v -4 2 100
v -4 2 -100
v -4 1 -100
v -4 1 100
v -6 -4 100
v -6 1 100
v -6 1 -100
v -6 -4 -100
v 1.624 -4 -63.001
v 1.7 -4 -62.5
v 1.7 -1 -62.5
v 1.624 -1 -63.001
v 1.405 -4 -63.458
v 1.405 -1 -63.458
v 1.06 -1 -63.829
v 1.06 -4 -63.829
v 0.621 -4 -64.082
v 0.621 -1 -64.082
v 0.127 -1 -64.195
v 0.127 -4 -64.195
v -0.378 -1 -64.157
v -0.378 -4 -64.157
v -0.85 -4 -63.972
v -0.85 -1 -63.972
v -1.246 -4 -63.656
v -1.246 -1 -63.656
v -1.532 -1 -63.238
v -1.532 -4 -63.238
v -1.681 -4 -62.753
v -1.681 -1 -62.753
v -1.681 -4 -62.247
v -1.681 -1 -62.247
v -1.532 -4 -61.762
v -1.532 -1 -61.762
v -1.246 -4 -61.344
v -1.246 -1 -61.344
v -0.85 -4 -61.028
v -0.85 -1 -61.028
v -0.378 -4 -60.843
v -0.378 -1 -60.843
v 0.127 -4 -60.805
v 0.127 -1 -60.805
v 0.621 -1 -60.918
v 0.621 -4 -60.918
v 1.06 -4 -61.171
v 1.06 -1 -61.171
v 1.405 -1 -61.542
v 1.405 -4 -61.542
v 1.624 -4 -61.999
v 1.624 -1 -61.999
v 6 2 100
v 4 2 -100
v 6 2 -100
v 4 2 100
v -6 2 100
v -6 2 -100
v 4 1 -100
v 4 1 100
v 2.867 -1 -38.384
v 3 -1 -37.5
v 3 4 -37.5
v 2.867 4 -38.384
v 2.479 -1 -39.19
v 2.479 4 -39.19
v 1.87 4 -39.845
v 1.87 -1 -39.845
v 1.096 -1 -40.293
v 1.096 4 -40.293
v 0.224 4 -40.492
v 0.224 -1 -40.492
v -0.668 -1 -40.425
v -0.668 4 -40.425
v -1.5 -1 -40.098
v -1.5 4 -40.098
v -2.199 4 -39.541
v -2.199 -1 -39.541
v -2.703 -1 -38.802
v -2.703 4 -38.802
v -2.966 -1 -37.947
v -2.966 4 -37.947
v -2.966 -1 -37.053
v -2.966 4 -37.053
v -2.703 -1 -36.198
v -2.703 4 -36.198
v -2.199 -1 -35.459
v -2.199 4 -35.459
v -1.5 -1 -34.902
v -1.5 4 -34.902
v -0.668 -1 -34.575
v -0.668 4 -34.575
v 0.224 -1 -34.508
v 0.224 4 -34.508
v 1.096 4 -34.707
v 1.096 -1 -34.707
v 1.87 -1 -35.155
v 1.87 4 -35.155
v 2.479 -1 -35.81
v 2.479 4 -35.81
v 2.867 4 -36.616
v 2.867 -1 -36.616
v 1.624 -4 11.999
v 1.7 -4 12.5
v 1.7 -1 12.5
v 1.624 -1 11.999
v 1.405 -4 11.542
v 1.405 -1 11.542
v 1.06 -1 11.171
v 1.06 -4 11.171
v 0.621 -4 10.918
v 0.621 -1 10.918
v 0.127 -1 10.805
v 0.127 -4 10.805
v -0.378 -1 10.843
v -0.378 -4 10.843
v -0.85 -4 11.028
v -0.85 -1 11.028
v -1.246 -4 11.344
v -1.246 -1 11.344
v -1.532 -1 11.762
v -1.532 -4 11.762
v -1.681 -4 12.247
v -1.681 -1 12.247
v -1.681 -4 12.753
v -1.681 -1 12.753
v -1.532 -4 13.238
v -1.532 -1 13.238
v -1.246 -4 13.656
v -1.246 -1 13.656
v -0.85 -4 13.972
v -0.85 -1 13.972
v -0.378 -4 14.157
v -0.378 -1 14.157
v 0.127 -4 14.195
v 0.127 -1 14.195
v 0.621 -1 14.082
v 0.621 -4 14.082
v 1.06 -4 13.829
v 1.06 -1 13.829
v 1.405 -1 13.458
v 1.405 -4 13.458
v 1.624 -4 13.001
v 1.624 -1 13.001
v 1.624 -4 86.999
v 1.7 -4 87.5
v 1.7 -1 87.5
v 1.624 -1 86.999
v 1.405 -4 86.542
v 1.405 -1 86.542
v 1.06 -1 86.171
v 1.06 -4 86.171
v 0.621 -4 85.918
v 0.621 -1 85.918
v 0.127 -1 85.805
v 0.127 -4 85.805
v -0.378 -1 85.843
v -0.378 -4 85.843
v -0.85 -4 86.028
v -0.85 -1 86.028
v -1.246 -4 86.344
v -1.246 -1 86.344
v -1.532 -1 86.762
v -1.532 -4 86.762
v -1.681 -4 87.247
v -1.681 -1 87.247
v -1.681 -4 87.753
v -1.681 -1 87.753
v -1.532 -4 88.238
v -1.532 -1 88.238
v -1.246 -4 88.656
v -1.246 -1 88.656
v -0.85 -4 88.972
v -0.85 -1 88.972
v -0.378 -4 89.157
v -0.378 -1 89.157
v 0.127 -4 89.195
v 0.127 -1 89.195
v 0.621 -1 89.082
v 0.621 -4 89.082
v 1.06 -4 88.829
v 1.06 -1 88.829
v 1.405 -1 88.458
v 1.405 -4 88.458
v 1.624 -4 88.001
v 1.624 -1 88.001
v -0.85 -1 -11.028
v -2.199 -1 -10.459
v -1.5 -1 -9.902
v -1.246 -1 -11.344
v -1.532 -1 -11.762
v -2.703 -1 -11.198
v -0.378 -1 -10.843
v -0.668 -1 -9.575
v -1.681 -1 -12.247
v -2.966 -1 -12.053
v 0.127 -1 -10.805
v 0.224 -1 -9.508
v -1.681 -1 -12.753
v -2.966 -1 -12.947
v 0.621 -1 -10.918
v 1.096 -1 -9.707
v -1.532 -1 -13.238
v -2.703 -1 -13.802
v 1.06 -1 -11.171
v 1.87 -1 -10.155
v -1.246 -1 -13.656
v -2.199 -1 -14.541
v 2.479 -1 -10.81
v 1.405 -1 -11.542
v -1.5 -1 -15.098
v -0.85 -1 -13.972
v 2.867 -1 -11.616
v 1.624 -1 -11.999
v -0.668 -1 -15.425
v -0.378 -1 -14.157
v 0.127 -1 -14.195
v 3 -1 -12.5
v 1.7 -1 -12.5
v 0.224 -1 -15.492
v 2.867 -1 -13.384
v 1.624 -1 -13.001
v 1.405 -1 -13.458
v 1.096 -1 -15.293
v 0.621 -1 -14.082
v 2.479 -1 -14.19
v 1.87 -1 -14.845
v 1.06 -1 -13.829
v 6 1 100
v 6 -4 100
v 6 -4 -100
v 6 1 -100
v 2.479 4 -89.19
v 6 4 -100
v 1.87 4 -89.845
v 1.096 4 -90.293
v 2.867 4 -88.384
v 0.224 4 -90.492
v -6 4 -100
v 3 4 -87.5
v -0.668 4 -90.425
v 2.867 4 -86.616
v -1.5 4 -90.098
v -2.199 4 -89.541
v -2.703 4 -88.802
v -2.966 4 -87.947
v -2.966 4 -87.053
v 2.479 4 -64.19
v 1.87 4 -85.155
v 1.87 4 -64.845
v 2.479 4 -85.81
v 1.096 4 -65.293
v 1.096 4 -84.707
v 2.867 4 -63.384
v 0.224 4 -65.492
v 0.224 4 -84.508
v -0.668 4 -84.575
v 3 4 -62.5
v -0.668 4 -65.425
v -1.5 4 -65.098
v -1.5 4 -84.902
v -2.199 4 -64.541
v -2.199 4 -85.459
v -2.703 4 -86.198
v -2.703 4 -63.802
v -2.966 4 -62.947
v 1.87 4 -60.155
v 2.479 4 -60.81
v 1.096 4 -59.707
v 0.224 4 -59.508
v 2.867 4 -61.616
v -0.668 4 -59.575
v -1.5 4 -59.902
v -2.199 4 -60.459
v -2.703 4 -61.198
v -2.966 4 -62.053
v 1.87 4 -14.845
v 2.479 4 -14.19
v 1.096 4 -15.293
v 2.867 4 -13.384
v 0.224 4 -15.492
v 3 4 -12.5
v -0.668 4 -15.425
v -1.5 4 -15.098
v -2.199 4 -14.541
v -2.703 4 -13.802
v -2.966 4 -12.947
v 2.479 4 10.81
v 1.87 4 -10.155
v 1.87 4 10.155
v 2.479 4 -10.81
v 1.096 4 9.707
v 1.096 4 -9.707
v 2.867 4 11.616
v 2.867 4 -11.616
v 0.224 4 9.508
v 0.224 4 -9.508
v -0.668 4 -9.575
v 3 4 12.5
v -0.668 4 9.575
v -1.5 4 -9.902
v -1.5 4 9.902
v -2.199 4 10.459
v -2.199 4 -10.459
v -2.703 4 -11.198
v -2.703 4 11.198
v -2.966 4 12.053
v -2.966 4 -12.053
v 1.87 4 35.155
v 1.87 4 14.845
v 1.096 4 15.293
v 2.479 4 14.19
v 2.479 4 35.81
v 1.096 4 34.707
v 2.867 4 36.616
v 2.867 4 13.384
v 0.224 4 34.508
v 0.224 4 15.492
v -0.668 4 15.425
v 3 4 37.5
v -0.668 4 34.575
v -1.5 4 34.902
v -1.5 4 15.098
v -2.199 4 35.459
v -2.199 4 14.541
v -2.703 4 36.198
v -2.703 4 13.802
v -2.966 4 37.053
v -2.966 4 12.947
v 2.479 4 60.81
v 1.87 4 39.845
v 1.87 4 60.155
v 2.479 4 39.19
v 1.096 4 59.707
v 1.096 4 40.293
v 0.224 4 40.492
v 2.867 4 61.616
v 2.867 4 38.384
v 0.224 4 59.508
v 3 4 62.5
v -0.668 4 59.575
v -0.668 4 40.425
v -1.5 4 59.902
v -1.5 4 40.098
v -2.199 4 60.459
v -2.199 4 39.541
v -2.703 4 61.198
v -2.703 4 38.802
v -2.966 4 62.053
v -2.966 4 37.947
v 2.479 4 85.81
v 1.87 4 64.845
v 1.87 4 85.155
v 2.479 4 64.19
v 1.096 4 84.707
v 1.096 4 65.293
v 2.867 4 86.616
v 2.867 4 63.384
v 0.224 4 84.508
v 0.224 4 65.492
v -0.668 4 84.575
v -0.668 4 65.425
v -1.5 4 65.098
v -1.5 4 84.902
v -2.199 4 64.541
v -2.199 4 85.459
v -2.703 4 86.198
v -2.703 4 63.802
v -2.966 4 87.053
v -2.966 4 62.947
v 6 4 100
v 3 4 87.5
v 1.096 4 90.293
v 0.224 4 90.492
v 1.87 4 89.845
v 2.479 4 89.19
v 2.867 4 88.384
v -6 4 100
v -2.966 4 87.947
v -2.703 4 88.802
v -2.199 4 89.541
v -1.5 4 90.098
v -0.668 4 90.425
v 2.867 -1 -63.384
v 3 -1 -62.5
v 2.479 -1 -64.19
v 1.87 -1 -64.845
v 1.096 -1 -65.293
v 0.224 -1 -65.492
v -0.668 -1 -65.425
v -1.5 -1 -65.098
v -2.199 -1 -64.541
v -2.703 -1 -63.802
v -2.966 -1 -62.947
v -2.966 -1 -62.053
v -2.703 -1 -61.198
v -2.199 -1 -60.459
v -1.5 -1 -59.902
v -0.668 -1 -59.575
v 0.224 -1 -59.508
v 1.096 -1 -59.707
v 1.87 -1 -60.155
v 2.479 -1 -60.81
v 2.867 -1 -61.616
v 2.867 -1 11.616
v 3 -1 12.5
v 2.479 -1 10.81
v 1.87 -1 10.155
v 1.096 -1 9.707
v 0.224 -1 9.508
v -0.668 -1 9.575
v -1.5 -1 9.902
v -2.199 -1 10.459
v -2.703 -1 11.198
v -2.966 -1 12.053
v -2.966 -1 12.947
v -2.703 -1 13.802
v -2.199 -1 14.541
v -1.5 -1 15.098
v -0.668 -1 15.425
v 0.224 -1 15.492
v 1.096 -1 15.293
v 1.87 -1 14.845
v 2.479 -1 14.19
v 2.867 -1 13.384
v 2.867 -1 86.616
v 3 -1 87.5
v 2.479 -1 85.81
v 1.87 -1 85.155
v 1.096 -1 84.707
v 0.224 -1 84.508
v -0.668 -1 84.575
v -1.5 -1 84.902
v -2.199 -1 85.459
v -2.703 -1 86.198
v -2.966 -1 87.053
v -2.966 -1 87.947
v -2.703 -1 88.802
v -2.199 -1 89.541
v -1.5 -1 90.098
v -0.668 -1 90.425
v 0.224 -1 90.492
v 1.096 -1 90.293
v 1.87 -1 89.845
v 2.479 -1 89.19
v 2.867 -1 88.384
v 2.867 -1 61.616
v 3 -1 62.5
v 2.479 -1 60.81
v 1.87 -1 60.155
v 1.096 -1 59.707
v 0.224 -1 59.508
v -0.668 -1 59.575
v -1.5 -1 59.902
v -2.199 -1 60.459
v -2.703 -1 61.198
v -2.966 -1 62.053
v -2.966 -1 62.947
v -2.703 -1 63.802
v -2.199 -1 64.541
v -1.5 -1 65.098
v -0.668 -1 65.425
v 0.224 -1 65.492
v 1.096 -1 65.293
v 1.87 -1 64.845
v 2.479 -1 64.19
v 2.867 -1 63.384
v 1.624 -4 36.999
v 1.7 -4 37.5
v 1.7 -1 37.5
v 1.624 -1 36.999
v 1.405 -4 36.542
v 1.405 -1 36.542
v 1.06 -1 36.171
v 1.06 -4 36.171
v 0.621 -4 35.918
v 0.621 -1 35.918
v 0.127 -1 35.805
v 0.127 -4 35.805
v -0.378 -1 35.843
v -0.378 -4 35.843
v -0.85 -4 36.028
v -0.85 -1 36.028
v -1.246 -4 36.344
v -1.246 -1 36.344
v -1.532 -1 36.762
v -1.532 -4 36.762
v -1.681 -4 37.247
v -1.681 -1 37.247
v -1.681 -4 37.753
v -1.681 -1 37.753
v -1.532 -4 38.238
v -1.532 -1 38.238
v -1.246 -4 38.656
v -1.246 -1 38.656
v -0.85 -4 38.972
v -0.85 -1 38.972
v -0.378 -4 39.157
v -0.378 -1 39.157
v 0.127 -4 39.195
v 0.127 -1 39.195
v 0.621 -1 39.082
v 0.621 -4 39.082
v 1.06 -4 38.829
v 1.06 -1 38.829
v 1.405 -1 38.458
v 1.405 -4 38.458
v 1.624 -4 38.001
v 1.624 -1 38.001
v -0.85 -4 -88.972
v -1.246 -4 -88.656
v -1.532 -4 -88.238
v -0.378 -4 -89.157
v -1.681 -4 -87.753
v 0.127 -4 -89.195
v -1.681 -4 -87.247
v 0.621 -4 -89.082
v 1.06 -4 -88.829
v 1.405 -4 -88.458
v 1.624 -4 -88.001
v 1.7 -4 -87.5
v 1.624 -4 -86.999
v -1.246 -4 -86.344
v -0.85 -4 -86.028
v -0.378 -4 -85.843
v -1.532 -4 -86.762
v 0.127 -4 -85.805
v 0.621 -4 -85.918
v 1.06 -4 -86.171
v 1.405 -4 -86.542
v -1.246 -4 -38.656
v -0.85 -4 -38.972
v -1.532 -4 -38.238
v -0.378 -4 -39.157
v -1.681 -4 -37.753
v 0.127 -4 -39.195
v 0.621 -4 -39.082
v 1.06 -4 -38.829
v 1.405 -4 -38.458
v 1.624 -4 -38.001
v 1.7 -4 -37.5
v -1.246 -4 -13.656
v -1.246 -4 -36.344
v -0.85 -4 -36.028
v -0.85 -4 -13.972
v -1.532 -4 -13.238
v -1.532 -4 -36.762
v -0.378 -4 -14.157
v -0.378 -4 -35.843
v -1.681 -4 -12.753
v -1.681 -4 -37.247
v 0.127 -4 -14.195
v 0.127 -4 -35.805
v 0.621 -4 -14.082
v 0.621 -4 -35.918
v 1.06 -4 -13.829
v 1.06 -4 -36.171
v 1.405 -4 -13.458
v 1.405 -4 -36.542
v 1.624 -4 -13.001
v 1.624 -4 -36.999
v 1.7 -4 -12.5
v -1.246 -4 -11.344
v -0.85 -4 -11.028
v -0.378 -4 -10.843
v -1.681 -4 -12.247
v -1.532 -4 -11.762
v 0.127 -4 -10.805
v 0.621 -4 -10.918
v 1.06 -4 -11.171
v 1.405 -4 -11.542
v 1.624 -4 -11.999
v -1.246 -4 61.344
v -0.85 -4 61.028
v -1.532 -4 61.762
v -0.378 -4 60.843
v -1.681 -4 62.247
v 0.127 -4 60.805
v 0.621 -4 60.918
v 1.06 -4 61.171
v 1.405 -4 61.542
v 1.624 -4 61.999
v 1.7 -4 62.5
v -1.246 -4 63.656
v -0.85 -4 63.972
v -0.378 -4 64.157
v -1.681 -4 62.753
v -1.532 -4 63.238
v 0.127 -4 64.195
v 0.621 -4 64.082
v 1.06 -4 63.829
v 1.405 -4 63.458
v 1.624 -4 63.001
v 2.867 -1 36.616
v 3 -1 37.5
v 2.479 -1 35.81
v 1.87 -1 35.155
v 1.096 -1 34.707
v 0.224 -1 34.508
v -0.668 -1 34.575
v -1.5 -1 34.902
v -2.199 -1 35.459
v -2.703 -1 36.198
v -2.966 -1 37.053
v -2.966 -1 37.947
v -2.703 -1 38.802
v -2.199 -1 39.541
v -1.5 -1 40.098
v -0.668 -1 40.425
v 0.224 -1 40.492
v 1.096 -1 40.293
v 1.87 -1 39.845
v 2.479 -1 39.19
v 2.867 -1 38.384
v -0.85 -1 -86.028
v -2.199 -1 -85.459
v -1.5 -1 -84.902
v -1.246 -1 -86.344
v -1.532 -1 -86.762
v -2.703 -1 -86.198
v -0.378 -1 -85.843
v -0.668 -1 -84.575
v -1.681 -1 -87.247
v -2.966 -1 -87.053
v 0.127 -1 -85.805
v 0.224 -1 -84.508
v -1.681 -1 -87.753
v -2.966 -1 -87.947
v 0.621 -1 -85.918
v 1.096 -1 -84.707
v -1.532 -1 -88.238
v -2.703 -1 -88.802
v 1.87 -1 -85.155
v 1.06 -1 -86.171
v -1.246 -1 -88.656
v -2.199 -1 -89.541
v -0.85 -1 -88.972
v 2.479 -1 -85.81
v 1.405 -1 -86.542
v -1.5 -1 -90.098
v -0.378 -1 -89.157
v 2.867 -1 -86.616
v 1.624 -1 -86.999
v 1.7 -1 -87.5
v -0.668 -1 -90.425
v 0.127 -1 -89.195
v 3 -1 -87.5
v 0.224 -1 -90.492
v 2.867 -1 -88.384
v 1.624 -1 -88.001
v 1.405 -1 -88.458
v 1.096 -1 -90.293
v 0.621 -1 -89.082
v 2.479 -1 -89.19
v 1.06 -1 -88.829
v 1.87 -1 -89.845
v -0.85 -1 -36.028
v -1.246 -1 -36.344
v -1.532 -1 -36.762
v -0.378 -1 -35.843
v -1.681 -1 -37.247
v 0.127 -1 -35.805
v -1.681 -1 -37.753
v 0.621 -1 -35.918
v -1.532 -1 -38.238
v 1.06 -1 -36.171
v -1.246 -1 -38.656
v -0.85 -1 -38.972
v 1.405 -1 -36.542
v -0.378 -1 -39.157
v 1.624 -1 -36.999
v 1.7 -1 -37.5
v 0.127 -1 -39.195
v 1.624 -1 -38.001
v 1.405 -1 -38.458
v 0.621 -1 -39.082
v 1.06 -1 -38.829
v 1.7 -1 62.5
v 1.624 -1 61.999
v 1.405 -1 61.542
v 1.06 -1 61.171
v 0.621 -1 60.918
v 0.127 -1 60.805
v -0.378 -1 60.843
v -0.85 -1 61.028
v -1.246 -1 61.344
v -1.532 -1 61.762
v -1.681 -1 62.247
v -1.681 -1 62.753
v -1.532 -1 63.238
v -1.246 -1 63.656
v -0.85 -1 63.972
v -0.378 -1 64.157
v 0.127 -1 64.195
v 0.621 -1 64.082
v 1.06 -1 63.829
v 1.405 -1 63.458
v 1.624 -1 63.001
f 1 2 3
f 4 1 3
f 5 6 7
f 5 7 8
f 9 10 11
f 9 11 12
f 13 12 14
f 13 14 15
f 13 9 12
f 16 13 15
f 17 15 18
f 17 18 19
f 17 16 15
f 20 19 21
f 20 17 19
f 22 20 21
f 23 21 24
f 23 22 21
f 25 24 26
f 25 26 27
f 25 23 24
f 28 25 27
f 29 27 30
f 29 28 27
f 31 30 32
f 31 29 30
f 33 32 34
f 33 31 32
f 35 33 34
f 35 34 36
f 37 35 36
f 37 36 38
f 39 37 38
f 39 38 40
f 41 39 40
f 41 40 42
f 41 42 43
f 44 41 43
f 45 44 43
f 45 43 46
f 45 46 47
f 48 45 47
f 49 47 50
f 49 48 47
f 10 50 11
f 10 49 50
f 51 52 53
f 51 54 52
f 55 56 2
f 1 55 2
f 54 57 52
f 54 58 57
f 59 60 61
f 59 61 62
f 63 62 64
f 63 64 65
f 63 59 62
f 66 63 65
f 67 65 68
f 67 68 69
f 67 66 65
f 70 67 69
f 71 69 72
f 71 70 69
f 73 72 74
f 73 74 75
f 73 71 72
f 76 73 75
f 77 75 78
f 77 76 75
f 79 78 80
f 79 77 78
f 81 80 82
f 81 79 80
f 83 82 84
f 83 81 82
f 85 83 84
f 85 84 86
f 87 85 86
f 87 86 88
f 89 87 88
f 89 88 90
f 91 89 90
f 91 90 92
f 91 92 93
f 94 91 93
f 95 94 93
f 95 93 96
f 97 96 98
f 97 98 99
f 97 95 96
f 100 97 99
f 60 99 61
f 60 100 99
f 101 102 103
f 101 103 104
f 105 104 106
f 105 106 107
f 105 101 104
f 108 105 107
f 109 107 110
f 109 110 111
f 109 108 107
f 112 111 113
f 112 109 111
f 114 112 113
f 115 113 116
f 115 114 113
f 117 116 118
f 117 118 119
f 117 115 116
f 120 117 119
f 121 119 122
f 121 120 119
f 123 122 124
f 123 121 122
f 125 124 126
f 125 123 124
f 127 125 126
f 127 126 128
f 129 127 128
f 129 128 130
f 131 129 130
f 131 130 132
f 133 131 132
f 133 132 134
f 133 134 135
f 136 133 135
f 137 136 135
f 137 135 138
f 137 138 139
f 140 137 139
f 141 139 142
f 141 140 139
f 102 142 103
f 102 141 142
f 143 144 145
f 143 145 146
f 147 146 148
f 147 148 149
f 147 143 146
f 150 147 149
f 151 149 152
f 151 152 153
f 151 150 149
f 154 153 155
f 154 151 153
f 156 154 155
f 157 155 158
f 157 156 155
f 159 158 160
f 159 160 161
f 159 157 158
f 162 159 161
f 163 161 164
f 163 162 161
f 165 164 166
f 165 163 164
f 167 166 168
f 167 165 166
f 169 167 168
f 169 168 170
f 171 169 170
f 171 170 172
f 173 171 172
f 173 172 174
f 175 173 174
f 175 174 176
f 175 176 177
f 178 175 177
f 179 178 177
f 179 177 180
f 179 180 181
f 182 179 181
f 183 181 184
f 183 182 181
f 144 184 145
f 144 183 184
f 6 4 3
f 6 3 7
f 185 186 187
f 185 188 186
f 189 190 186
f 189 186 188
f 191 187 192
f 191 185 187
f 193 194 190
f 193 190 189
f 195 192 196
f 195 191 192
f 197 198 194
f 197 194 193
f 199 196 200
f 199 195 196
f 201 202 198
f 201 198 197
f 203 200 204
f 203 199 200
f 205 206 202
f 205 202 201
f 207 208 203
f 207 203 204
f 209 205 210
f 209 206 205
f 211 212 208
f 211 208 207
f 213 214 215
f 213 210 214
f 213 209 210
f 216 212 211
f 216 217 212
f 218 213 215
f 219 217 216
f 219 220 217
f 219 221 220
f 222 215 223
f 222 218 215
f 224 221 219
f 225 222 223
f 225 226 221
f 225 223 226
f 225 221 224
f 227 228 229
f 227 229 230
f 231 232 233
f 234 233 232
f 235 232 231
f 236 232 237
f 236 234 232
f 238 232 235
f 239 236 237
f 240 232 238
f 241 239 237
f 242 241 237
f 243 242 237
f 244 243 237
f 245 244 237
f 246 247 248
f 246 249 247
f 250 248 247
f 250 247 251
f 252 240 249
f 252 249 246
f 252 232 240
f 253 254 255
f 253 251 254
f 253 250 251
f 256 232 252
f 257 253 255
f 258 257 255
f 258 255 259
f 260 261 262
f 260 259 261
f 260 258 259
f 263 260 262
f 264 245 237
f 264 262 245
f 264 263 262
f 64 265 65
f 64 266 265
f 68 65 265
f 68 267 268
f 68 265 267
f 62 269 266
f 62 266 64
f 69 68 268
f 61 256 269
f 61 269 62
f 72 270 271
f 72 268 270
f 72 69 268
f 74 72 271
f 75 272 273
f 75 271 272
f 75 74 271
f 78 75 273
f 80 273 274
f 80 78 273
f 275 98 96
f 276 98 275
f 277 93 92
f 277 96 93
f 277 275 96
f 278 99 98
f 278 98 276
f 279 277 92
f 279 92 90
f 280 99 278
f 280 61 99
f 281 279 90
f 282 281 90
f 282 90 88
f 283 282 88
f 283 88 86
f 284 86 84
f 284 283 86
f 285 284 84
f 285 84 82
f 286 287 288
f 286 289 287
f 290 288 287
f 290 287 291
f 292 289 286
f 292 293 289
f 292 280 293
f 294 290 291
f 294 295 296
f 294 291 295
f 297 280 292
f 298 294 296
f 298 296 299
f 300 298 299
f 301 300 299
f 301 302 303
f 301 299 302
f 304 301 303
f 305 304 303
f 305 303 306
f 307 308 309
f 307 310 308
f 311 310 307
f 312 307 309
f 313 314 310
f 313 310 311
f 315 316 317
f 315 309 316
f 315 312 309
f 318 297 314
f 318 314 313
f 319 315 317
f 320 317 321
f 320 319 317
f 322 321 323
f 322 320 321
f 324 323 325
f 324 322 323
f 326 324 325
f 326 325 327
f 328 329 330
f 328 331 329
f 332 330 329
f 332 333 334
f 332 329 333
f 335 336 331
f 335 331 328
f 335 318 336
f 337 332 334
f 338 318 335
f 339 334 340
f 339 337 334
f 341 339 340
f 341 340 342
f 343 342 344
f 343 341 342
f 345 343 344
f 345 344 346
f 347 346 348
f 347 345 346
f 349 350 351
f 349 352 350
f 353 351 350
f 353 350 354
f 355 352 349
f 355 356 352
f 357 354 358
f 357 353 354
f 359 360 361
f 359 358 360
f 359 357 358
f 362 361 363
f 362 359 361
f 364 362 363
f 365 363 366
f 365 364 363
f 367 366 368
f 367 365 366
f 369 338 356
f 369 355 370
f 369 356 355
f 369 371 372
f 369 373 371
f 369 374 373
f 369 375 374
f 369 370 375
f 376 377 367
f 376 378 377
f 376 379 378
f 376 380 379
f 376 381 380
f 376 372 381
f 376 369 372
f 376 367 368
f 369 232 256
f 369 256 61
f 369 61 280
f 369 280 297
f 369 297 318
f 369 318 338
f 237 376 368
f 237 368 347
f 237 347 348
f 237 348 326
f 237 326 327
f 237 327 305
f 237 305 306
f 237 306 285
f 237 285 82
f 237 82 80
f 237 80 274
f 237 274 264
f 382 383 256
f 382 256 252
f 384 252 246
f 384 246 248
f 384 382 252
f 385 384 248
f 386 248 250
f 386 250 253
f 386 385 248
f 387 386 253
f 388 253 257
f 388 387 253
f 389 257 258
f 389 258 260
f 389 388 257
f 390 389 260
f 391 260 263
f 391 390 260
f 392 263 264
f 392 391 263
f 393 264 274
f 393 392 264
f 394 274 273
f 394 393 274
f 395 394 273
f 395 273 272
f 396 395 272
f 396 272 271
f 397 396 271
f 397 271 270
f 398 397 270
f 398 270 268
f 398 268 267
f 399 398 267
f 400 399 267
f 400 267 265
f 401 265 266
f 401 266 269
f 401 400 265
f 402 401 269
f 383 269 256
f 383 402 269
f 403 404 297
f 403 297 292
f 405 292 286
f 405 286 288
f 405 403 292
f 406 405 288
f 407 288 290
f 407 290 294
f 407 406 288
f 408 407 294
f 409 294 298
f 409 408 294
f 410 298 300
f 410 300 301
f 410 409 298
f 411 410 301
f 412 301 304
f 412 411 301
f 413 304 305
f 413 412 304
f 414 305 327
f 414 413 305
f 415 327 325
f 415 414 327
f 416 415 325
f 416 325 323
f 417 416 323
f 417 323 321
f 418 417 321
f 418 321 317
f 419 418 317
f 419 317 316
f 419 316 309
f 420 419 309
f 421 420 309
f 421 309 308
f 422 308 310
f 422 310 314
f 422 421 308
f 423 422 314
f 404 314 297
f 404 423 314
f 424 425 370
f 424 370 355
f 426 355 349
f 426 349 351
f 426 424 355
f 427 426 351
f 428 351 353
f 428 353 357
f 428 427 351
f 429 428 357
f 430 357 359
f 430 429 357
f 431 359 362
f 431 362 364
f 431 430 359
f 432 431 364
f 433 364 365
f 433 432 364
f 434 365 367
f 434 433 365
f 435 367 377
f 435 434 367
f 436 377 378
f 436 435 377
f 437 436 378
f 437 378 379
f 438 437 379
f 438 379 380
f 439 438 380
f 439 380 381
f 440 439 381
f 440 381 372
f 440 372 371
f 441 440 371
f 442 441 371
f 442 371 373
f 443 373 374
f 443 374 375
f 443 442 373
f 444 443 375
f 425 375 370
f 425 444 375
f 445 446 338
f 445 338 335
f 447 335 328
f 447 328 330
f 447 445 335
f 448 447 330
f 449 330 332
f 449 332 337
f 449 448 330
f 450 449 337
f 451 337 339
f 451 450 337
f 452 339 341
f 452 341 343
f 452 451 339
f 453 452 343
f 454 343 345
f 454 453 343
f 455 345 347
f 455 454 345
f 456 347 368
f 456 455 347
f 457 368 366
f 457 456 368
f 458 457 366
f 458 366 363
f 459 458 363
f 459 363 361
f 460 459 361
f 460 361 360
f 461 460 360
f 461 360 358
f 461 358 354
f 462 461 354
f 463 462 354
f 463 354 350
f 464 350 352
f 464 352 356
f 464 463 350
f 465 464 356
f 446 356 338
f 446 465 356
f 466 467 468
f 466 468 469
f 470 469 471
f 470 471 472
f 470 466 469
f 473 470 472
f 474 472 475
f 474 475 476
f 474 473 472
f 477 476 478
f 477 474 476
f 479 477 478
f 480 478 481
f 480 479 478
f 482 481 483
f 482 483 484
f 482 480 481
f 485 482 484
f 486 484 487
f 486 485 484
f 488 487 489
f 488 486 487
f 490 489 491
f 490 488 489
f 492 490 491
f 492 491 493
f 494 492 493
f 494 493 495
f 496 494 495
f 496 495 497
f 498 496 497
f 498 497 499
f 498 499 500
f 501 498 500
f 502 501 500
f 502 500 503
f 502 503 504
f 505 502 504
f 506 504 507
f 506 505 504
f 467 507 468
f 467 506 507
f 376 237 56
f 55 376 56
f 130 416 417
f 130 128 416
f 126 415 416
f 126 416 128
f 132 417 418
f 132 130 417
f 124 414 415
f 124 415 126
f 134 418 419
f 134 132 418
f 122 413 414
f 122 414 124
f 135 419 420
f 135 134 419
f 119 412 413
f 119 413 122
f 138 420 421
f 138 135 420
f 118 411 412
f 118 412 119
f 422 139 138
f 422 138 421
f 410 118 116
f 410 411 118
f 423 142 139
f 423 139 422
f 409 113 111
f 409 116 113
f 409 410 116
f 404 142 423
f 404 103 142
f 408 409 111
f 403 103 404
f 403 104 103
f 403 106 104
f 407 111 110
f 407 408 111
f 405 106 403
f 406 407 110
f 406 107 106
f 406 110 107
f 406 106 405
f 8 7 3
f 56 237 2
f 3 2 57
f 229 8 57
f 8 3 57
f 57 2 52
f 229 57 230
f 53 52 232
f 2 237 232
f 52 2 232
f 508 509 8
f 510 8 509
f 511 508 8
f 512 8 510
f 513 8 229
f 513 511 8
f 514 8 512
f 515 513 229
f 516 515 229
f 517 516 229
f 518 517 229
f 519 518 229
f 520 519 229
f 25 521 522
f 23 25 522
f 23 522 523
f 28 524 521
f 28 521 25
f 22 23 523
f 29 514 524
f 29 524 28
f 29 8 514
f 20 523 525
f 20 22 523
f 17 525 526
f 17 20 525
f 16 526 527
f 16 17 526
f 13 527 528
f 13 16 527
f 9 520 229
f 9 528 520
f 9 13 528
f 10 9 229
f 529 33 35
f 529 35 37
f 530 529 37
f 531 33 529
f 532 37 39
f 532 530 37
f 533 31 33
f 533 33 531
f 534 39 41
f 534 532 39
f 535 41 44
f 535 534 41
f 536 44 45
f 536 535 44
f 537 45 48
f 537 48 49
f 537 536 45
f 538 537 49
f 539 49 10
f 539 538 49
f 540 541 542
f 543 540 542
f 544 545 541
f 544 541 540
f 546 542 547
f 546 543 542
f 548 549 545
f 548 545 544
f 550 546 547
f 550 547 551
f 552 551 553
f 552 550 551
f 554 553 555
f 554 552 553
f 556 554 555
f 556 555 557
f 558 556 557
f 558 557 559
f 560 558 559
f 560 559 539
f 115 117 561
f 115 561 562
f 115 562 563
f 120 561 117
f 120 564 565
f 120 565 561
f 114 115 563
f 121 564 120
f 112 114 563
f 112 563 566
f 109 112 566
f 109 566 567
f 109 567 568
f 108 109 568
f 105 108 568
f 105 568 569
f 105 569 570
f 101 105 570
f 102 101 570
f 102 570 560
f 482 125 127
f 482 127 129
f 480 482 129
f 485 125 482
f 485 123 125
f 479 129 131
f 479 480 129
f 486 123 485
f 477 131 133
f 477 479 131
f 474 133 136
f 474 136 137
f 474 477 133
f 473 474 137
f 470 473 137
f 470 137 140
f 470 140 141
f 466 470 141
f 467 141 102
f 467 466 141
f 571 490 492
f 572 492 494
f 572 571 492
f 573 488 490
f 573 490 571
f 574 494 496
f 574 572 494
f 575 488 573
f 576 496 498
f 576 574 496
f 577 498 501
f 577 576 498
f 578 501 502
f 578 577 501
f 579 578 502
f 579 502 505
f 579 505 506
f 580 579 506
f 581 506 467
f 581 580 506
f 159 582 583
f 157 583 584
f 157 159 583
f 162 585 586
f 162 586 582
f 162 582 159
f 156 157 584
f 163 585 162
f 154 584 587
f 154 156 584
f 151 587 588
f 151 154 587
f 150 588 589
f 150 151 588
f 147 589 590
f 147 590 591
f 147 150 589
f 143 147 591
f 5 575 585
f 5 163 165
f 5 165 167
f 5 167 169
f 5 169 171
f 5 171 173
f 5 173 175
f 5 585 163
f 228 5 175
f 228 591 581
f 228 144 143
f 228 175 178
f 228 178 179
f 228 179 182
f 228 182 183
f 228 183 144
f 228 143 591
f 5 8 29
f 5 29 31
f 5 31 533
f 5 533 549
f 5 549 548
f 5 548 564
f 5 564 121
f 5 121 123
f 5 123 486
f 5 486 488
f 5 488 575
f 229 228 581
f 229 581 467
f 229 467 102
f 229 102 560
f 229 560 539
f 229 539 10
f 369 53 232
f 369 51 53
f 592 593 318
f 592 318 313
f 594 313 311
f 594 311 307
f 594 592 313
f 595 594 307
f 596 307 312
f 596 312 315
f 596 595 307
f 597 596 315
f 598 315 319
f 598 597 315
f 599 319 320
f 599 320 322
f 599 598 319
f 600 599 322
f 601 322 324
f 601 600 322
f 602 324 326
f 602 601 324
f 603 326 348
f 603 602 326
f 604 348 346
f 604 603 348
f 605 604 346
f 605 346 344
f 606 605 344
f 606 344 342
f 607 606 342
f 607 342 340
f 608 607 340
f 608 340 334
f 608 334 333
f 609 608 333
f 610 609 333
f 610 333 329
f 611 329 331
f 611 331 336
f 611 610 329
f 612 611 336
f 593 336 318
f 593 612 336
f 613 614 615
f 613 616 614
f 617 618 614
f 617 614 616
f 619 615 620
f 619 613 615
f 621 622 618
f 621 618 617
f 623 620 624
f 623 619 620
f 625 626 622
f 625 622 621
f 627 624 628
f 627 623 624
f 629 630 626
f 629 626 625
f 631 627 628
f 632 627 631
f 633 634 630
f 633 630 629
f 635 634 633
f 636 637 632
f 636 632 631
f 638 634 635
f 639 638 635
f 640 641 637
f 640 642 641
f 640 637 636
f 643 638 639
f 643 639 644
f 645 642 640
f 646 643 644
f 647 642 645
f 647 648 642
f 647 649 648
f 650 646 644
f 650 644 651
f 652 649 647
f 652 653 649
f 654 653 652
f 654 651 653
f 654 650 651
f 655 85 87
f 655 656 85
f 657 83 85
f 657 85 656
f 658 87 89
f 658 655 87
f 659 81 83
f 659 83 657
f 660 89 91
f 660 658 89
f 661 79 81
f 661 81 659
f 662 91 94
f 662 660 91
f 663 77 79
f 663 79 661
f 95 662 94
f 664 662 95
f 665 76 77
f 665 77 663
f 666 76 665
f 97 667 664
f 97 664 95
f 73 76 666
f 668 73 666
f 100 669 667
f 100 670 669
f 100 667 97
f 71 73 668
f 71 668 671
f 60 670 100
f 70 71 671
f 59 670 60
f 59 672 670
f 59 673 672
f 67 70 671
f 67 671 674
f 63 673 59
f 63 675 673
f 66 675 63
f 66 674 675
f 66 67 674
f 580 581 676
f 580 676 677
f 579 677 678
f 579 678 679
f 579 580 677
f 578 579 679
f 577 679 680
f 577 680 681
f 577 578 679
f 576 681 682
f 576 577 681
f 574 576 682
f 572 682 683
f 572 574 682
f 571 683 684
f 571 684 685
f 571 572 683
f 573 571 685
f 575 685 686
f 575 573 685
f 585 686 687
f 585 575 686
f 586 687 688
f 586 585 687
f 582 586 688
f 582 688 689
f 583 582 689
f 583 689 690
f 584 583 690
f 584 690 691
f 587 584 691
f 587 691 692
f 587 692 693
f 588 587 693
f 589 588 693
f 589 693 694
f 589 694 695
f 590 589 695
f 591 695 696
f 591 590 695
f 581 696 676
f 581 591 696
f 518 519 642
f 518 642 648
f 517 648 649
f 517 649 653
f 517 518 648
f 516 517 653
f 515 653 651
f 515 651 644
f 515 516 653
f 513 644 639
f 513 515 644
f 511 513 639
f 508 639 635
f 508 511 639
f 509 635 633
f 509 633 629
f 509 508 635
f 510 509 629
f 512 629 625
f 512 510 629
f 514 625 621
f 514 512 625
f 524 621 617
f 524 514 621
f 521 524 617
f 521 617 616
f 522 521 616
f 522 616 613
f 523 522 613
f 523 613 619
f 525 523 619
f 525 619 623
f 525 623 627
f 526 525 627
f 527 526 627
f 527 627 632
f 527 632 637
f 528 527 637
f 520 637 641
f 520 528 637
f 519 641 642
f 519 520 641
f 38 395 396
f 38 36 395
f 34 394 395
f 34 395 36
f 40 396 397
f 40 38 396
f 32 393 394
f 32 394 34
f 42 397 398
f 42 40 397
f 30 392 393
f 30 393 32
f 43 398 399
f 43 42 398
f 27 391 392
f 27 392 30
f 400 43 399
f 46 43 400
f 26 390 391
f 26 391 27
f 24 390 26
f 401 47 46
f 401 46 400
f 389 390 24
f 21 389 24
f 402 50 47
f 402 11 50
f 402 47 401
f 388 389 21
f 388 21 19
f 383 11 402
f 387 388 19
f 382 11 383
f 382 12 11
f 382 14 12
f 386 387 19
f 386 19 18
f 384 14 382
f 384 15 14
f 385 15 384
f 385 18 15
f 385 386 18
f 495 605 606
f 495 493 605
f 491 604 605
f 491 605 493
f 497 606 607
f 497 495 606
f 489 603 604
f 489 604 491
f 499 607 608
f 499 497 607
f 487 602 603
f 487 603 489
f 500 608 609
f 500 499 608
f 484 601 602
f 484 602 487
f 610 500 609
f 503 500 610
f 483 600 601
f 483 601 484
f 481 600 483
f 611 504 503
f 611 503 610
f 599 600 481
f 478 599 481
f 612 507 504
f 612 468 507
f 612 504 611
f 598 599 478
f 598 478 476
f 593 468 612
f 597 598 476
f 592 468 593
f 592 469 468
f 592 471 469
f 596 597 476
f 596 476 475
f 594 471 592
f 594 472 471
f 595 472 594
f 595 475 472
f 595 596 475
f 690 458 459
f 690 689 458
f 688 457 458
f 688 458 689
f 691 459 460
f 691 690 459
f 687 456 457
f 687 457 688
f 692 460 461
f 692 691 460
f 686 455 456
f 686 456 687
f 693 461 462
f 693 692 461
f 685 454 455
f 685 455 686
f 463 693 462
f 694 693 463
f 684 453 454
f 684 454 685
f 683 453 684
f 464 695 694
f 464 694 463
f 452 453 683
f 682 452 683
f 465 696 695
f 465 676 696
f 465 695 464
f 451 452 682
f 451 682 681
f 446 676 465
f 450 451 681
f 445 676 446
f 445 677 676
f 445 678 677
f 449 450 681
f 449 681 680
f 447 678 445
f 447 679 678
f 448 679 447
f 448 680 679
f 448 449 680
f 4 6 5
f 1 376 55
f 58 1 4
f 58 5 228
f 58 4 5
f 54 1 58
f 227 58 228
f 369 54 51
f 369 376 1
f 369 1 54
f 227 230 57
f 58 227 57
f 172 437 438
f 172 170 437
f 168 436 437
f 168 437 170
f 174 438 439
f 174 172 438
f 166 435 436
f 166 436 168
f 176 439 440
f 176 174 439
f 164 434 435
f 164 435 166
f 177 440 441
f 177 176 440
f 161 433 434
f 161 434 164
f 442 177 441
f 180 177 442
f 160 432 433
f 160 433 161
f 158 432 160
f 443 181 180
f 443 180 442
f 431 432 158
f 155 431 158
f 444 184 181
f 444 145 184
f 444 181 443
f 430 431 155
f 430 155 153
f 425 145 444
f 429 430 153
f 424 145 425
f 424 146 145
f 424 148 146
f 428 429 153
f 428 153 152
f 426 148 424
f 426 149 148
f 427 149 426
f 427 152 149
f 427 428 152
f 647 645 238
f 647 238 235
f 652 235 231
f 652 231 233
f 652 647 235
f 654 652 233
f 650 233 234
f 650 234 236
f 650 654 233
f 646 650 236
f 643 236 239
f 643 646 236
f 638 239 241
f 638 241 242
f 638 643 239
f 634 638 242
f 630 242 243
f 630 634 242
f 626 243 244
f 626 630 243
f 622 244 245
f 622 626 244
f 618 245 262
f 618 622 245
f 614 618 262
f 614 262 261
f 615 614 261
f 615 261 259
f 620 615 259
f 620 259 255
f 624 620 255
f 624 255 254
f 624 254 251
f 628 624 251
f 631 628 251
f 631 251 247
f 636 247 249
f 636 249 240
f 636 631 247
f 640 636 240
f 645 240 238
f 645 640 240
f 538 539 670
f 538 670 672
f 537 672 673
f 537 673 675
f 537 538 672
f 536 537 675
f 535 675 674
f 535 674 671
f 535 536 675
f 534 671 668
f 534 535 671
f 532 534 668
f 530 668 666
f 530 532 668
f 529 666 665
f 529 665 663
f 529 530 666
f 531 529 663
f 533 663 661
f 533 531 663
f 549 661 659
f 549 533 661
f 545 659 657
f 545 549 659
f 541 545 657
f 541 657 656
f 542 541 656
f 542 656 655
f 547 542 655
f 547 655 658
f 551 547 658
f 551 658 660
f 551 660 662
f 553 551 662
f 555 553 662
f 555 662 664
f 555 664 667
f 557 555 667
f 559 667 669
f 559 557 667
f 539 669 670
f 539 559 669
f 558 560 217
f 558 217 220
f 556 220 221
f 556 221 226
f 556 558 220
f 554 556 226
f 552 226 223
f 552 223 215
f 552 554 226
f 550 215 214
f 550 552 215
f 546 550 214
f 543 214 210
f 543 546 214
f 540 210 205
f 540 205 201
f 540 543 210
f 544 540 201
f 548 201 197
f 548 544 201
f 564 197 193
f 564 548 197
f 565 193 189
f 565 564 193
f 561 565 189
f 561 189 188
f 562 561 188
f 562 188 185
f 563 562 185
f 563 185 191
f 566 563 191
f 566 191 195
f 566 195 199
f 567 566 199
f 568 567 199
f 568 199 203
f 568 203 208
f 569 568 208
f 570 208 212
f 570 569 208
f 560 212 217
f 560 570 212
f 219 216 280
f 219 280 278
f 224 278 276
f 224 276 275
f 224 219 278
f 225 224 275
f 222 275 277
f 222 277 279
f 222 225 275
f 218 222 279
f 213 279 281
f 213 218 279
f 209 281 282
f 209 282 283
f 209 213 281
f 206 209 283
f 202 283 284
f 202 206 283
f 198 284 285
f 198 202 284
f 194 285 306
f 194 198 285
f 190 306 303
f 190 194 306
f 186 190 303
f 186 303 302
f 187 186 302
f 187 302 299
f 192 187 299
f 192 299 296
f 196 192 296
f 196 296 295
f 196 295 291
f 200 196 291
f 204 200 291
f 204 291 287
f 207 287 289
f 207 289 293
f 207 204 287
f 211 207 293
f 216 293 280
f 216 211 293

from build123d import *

# Parameters (mm, degrees)
BOSS_EXTRU_1_DEPTH         = 100
PER_AGEAVANC_1_START       = -1
PER_AGEAVANC_1_OUTLINE_R   = 3
PER_AGEAVANC_1_DEPTH       = 5
PER_AGEAVANC_1_START_2     = -4
PER_AGEAVANC_1_2_OUTLINE_R = 1.7
PER_AGEAVANC_1_2_DEPTH     = 3


# Read off the part's stored shape, not the designer's step: PerçageAvancé1
with BuildPart() as part:
    # Esquisse1 → Boss.-Extru.1 (new, symmetric)
    with BuildSketch(Plane.XY):
        Polygon((6, 2), (6, 4), (-6, 4), (-6, 2), (-4, 2), (-4, 1), (-6, 1), (-6, -4), (6, -4), (6, 1), (4, 1), (4, 2), align=None)
    extrude(amount=BOSS_EXTRU_1_DEPTH, both=True)

    # PerçageAvancé1 outline → PerçageAvancé1 (cut)
    with BuildSketch(Plane(origin=(0, 0, 0), x_dir=(1, 0, 0), z_dir=(0, 1, 0)).offset(PER_AGEAVANC_1_START)):
        with Locations((0, -87.5)):
            Circle(PER_AGEAVANC_1_OUTLINE_R)
        with Locations((0, -62.5)):
            Circle(PER_AGEAVANC_1_OUTLINE_R)
        with Locations((0, -37.5)):
            Circle(PER_AGEAVANC_1_OUTLINE_R)
        with Locations((0, -12.5)):
            Circle(PER_AGEAVANC_1_OUTLINE_R)
        with Locations((0, 12.5)):
            Circle(PER_AGEAVANC_1_OUTLINE_R)
        with Locations((0, 87.5)):
            Circle(PER_AGEAVANC_1_OUTLINE_R)
        with Locations((0, 62.5)):
            Circle(PER_AGEAVANC_1_OUTLINE_R)
        with Locations((0, 37.5)):
            Circle(PER_AGEAVANC_1_OUTLINE_R)
    extrude(amount=PER_AGEAVANC_1_DEPTH, mode=Mode.SUBTRACT)

    # Per_ageAvanc_1 2 outline → Per_ageAvanc_1 2 (cut)
    with BuildSketch(Plane(origin=(0, 0, 0), x_dir=(1, 0, 0), z_dir=(0, 1, 0)).offset(PER_AGEAVANC_1_START_2)):
        with Locations((0, -87.5)):
            Circle(PER_AGEAVANC_1_2_OUTLINE_R)
        with Locations((0, -62.5)):
            Circle(PER_AGEAVANC_1_2_OUTLINE_R)
        with Locations((0, -37.5)):
            Circle(PER_AGEAVANC_1_2_OUTLINE_R)
        with Locations((0, -12.5)):
            Circle(PER_AGEAVANC_1_2_OUTLINE_R)
        with Locations((0, 12.5)):
            Circle(PER_AGEAVANC_1_2_OUTLINE_R)
        with Locations((0, 87.5)):
            Circle(PER_AGEAVANC_1_2_OUTLINE_R)
        with Locations((0, 62.5)):
            Circle(PER_AGEAVANC_1_2_OUTLINE_R)
        with Locations((0, 37.5)):
            Circle(PER_AGEAVANC_1_2_OUTLINE_R)
    extrude(amount=PER_AGEAVANC_1_2_DEPTH, mode=Mode.SUBTRACT)


solid = part.part
